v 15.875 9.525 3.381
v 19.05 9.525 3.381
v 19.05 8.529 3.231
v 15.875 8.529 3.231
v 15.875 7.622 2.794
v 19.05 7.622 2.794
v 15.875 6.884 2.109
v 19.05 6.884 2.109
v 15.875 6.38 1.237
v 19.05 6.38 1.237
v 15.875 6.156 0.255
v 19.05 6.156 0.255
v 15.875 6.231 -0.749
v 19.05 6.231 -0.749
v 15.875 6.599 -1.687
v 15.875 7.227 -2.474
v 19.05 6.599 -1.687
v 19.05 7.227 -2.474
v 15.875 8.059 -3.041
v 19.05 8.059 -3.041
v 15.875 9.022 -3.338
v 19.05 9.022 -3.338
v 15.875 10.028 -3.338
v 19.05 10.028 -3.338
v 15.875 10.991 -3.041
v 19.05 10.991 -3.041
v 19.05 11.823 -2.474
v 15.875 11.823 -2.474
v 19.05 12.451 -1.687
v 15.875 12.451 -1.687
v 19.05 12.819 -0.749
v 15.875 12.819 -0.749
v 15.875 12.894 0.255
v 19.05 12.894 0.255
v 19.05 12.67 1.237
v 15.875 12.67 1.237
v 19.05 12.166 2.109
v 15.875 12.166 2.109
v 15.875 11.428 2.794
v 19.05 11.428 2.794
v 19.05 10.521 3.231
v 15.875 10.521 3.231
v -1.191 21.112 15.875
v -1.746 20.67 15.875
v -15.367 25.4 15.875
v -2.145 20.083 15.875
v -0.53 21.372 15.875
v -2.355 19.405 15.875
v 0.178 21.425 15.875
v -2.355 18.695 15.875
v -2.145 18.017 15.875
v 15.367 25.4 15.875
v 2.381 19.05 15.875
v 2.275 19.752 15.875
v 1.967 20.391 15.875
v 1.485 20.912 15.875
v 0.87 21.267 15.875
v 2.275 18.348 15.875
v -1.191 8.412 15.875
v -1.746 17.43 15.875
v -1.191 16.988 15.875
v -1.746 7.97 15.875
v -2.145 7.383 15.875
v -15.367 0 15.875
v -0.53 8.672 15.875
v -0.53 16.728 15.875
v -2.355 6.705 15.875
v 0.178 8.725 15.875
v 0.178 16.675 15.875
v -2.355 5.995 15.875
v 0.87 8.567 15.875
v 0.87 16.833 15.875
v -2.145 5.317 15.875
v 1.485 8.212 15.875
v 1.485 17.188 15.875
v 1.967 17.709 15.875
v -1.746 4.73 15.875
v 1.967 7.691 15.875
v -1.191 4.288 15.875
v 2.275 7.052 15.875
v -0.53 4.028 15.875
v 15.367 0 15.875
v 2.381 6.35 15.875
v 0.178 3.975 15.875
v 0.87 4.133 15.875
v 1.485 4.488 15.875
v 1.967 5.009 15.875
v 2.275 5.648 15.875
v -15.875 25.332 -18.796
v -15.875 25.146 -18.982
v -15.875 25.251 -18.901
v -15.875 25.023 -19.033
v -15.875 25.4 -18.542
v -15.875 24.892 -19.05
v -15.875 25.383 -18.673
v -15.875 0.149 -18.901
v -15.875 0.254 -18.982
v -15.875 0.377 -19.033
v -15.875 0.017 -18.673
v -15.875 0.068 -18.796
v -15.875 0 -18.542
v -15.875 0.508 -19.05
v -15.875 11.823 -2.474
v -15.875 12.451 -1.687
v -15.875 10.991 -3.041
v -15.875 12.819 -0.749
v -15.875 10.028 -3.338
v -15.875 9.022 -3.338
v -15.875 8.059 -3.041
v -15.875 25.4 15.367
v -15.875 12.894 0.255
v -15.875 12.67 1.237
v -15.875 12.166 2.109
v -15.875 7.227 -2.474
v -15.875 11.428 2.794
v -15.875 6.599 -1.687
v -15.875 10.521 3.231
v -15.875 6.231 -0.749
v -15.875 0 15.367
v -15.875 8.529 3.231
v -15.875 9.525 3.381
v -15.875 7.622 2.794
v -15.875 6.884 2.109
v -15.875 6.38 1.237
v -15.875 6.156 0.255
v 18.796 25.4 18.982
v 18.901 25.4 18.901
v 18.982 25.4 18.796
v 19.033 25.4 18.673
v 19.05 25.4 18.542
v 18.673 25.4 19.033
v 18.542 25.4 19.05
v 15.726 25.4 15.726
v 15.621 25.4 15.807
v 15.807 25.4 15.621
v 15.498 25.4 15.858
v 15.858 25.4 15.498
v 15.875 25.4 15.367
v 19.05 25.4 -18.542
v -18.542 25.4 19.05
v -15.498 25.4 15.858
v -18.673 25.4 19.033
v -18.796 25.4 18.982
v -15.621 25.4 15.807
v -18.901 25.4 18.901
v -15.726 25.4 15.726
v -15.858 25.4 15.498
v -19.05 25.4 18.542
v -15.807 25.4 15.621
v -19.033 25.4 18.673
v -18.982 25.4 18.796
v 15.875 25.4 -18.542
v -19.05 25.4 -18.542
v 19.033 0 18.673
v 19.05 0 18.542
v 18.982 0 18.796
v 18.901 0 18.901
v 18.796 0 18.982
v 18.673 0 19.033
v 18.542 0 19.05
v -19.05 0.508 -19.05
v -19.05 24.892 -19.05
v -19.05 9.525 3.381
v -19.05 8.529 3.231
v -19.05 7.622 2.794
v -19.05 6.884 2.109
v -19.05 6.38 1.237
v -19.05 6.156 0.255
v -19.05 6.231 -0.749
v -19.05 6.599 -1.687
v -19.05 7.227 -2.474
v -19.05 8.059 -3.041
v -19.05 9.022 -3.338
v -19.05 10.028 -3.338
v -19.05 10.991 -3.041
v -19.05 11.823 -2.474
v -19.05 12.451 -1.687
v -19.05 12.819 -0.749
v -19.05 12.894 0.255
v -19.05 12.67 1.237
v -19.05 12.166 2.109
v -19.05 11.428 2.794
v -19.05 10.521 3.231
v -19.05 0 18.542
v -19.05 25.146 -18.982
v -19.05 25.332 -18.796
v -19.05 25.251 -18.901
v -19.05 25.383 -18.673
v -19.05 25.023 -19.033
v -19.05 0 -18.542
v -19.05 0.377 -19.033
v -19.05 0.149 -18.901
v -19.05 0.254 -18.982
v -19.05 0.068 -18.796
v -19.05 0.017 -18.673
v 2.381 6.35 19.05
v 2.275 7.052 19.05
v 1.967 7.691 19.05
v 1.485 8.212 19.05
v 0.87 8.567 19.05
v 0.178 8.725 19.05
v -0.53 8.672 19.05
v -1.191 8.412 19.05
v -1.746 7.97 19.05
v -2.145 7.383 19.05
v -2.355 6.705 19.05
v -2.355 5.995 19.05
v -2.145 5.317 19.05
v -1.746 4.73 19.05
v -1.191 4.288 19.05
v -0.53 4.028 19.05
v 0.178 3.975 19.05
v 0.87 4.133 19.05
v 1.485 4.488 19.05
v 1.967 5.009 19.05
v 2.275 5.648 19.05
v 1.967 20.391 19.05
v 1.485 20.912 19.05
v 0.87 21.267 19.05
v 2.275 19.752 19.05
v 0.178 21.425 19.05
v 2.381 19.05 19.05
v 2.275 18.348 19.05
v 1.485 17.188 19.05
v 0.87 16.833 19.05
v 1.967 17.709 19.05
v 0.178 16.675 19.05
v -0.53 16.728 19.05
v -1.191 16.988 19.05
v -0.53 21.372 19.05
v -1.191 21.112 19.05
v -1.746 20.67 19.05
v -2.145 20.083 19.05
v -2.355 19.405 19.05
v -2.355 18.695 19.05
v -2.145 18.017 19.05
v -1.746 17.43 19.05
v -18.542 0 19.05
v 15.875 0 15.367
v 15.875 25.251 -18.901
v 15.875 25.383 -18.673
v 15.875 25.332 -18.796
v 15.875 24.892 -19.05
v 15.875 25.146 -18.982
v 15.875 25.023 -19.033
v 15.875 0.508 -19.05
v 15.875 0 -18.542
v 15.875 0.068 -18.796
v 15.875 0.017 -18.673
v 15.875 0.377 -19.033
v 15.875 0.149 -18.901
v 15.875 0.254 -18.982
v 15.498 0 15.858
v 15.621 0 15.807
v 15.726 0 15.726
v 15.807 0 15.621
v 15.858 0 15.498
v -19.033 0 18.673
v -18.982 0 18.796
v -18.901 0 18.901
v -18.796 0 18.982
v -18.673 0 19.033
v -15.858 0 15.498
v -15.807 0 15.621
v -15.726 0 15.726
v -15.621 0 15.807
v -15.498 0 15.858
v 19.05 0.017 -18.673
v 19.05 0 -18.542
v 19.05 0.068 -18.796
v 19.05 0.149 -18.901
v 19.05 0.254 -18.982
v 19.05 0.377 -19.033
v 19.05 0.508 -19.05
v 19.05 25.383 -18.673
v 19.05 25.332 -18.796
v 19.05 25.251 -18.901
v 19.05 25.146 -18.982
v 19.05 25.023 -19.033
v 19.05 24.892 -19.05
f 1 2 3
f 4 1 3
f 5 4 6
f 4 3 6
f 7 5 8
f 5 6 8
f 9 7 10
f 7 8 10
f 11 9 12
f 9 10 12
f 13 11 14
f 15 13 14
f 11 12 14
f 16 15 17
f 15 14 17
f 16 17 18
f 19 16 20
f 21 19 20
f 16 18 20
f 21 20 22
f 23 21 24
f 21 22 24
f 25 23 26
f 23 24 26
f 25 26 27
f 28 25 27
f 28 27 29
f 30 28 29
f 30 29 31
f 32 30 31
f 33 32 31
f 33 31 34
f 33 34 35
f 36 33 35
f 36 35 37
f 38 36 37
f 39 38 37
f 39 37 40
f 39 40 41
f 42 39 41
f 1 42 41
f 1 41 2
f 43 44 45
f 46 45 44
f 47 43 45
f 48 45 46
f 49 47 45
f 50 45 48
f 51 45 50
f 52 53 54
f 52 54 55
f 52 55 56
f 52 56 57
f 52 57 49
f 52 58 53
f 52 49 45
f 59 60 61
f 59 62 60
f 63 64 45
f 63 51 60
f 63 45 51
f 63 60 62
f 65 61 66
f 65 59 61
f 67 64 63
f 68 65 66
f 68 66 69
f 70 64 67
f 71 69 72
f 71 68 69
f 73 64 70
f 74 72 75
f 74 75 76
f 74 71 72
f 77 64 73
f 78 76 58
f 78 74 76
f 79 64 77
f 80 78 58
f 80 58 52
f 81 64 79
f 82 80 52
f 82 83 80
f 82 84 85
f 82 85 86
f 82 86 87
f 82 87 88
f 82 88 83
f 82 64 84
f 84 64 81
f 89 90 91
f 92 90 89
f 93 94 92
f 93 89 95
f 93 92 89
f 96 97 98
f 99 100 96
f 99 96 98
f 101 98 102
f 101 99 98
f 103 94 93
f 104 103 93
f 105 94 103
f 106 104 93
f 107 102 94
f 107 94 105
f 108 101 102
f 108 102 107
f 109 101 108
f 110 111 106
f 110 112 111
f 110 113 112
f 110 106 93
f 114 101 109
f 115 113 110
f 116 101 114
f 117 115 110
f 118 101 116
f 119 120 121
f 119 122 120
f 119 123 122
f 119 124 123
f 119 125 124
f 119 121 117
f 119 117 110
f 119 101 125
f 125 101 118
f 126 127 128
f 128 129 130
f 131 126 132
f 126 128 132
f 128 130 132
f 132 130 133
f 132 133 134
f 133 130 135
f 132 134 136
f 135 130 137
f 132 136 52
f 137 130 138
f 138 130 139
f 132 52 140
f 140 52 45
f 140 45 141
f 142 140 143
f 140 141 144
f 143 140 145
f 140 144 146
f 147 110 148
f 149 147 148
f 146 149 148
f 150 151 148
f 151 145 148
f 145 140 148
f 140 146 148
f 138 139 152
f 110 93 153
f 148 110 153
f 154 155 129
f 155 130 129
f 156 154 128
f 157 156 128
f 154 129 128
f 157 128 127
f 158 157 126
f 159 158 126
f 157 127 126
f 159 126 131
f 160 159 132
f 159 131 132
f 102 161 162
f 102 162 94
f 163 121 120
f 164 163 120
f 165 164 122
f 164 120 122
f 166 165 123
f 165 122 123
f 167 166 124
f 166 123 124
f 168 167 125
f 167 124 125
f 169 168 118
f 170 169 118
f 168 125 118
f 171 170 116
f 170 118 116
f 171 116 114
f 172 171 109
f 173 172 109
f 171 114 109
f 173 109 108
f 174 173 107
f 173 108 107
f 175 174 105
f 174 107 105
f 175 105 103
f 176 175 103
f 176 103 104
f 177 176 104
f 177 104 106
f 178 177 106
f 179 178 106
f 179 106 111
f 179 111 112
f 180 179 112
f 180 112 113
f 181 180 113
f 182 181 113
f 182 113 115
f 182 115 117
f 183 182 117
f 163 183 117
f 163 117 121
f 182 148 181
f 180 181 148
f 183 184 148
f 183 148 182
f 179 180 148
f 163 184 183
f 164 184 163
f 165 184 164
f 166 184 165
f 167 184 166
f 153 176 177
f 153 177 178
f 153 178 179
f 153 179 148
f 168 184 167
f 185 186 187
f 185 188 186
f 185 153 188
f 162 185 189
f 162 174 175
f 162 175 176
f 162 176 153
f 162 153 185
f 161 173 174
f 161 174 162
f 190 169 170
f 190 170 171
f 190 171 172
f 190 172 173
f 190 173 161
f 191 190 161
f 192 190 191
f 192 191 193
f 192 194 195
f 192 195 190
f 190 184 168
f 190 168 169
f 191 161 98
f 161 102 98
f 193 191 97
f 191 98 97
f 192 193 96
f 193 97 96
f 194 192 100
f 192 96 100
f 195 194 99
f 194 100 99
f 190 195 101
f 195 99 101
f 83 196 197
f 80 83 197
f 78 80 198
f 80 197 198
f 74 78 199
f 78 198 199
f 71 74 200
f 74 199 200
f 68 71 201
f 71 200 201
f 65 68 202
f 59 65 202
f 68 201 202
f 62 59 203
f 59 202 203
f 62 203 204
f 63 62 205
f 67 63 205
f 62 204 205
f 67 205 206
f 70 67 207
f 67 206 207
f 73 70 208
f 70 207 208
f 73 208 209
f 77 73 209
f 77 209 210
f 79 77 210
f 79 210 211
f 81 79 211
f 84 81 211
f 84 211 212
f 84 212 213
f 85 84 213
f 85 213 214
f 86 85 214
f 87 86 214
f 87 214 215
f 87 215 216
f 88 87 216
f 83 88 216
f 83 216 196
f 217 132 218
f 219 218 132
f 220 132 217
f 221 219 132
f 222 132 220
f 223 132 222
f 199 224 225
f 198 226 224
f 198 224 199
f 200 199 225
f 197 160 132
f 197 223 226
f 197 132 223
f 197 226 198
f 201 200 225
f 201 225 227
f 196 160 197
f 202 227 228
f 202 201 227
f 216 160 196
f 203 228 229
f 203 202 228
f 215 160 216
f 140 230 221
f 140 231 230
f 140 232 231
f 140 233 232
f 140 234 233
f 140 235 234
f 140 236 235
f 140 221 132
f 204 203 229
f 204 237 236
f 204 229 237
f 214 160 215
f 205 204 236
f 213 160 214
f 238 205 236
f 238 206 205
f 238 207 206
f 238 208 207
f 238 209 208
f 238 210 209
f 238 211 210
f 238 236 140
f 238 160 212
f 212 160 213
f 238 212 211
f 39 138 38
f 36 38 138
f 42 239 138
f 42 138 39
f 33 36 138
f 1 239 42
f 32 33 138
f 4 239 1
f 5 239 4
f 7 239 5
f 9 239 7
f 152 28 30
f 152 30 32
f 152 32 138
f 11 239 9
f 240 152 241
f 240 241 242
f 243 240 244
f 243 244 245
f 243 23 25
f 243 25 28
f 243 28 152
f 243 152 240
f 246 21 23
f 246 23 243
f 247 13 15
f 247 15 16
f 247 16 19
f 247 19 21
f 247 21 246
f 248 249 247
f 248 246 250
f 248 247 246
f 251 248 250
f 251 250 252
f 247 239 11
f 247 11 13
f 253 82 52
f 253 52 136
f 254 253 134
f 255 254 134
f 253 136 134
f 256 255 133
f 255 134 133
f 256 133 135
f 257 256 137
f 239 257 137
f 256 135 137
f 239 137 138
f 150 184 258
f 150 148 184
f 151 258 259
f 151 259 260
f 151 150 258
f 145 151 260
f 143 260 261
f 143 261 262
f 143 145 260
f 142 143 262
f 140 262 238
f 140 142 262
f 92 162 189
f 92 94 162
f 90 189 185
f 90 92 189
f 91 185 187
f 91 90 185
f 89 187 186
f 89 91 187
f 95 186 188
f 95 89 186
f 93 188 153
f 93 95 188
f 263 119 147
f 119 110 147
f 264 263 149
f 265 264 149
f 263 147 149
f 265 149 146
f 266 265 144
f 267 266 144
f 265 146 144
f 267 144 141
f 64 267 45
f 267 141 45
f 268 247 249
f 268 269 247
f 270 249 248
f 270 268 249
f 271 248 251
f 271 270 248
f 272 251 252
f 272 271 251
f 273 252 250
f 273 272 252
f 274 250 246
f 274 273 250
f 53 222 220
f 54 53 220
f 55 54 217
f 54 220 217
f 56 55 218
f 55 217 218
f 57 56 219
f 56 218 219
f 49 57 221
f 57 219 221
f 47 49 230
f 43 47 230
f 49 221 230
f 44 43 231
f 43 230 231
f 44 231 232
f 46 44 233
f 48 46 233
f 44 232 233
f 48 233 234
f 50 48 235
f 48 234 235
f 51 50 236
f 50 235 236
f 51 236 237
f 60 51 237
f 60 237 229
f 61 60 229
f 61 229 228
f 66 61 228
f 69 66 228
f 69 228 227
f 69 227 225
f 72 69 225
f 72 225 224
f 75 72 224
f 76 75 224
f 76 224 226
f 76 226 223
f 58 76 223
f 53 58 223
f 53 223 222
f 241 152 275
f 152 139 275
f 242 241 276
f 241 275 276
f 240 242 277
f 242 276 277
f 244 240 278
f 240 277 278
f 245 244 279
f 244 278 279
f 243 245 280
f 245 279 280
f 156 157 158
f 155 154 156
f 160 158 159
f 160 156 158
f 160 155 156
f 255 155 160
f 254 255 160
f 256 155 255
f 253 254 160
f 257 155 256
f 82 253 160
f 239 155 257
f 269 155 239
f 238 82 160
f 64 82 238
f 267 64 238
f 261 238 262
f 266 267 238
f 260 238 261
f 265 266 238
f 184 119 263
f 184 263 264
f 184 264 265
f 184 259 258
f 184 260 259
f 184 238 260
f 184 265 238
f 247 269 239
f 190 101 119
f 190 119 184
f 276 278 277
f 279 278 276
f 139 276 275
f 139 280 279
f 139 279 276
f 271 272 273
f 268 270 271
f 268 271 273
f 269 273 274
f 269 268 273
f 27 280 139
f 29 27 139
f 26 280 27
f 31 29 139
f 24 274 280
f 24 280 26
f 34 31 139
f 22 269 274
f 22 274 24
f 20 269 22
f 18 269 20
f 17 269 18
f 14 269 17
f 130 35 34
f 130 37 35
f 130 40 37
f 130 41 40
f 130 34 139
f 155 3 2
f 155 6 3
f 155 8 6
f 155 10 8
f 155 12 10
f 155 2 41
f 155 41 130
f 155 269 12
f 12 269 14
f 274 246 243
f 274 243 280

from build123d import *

# Parameters (mm, degrees)
BOSS_EXTRUDE1_DEPTH            = 25.4
F_1_4_CLEARANCE_HOLE1_D        = 6.7564
F_3_16_0_1875_DIAMETER_HOLE1_D = 4.7625
FILLET1_R                      = 0.508


with BuildPart() as part:
    # Sketch1 → Boss-Extrude1 (new body)
    with BuildSketch(Plane(origin=(0, 0, 0), x_dir=(1, 0, 0), z_dir=(0, 1, 0))):
        Polygon((-15.875, 19.05), (-15.875, -15.875), (15.875, -15.875), (15.875, 19.05), (19.05, 19.05), (19.05, -19.05), (-19.05, -19.05), (-19.05, 19.05), align=None)
    extrude(amount=BOSS_EXTRUDE1_DEPTH)

    # 1/4 Clearance Hole1 (through all)
    with Locations(Plane(origin=(-19.05, 0, 0), x_dir=(0, 0, -1), z_dir=(-1, 0, 0))):
        with Locations((-0.00254, -9.525)):
            Hole(F_1_4_CLEARANCE_HOLE1_D / 2)

    # 3/16 (0.1875) Diameter Hole1 (through all)
    with Locations(Plane(origin=(0, 0, 15.875), x_dir=(-1, 0, 0), z_dir=(0, 0, -1))):
        with Locations((0, 6.35), (0, 19.05)):
            Hole(F_3_16_0_1875_DIAMETER_HOLE1_D / 2)

    # Fillet1
    fillet1_edges = [part.edges().sort_by_distance(p)[0] for p in [
        (17.4625, 0, -19.05),
        (19.05, 12.7, 19.05),
        (-19.05, 12.7, 19.05),
        (-15.875, 12.7, 15.875),
        (15.875, 12.7, 15.875),
        (-17.4625, 25.4, -19.05),
        (17.4625, 25.4, -19.05),
        (-17.4625, 0, -19.05),
    ]]
    fillet(fillet1_edges, radius=FILLET1_R)


solid = part.part
